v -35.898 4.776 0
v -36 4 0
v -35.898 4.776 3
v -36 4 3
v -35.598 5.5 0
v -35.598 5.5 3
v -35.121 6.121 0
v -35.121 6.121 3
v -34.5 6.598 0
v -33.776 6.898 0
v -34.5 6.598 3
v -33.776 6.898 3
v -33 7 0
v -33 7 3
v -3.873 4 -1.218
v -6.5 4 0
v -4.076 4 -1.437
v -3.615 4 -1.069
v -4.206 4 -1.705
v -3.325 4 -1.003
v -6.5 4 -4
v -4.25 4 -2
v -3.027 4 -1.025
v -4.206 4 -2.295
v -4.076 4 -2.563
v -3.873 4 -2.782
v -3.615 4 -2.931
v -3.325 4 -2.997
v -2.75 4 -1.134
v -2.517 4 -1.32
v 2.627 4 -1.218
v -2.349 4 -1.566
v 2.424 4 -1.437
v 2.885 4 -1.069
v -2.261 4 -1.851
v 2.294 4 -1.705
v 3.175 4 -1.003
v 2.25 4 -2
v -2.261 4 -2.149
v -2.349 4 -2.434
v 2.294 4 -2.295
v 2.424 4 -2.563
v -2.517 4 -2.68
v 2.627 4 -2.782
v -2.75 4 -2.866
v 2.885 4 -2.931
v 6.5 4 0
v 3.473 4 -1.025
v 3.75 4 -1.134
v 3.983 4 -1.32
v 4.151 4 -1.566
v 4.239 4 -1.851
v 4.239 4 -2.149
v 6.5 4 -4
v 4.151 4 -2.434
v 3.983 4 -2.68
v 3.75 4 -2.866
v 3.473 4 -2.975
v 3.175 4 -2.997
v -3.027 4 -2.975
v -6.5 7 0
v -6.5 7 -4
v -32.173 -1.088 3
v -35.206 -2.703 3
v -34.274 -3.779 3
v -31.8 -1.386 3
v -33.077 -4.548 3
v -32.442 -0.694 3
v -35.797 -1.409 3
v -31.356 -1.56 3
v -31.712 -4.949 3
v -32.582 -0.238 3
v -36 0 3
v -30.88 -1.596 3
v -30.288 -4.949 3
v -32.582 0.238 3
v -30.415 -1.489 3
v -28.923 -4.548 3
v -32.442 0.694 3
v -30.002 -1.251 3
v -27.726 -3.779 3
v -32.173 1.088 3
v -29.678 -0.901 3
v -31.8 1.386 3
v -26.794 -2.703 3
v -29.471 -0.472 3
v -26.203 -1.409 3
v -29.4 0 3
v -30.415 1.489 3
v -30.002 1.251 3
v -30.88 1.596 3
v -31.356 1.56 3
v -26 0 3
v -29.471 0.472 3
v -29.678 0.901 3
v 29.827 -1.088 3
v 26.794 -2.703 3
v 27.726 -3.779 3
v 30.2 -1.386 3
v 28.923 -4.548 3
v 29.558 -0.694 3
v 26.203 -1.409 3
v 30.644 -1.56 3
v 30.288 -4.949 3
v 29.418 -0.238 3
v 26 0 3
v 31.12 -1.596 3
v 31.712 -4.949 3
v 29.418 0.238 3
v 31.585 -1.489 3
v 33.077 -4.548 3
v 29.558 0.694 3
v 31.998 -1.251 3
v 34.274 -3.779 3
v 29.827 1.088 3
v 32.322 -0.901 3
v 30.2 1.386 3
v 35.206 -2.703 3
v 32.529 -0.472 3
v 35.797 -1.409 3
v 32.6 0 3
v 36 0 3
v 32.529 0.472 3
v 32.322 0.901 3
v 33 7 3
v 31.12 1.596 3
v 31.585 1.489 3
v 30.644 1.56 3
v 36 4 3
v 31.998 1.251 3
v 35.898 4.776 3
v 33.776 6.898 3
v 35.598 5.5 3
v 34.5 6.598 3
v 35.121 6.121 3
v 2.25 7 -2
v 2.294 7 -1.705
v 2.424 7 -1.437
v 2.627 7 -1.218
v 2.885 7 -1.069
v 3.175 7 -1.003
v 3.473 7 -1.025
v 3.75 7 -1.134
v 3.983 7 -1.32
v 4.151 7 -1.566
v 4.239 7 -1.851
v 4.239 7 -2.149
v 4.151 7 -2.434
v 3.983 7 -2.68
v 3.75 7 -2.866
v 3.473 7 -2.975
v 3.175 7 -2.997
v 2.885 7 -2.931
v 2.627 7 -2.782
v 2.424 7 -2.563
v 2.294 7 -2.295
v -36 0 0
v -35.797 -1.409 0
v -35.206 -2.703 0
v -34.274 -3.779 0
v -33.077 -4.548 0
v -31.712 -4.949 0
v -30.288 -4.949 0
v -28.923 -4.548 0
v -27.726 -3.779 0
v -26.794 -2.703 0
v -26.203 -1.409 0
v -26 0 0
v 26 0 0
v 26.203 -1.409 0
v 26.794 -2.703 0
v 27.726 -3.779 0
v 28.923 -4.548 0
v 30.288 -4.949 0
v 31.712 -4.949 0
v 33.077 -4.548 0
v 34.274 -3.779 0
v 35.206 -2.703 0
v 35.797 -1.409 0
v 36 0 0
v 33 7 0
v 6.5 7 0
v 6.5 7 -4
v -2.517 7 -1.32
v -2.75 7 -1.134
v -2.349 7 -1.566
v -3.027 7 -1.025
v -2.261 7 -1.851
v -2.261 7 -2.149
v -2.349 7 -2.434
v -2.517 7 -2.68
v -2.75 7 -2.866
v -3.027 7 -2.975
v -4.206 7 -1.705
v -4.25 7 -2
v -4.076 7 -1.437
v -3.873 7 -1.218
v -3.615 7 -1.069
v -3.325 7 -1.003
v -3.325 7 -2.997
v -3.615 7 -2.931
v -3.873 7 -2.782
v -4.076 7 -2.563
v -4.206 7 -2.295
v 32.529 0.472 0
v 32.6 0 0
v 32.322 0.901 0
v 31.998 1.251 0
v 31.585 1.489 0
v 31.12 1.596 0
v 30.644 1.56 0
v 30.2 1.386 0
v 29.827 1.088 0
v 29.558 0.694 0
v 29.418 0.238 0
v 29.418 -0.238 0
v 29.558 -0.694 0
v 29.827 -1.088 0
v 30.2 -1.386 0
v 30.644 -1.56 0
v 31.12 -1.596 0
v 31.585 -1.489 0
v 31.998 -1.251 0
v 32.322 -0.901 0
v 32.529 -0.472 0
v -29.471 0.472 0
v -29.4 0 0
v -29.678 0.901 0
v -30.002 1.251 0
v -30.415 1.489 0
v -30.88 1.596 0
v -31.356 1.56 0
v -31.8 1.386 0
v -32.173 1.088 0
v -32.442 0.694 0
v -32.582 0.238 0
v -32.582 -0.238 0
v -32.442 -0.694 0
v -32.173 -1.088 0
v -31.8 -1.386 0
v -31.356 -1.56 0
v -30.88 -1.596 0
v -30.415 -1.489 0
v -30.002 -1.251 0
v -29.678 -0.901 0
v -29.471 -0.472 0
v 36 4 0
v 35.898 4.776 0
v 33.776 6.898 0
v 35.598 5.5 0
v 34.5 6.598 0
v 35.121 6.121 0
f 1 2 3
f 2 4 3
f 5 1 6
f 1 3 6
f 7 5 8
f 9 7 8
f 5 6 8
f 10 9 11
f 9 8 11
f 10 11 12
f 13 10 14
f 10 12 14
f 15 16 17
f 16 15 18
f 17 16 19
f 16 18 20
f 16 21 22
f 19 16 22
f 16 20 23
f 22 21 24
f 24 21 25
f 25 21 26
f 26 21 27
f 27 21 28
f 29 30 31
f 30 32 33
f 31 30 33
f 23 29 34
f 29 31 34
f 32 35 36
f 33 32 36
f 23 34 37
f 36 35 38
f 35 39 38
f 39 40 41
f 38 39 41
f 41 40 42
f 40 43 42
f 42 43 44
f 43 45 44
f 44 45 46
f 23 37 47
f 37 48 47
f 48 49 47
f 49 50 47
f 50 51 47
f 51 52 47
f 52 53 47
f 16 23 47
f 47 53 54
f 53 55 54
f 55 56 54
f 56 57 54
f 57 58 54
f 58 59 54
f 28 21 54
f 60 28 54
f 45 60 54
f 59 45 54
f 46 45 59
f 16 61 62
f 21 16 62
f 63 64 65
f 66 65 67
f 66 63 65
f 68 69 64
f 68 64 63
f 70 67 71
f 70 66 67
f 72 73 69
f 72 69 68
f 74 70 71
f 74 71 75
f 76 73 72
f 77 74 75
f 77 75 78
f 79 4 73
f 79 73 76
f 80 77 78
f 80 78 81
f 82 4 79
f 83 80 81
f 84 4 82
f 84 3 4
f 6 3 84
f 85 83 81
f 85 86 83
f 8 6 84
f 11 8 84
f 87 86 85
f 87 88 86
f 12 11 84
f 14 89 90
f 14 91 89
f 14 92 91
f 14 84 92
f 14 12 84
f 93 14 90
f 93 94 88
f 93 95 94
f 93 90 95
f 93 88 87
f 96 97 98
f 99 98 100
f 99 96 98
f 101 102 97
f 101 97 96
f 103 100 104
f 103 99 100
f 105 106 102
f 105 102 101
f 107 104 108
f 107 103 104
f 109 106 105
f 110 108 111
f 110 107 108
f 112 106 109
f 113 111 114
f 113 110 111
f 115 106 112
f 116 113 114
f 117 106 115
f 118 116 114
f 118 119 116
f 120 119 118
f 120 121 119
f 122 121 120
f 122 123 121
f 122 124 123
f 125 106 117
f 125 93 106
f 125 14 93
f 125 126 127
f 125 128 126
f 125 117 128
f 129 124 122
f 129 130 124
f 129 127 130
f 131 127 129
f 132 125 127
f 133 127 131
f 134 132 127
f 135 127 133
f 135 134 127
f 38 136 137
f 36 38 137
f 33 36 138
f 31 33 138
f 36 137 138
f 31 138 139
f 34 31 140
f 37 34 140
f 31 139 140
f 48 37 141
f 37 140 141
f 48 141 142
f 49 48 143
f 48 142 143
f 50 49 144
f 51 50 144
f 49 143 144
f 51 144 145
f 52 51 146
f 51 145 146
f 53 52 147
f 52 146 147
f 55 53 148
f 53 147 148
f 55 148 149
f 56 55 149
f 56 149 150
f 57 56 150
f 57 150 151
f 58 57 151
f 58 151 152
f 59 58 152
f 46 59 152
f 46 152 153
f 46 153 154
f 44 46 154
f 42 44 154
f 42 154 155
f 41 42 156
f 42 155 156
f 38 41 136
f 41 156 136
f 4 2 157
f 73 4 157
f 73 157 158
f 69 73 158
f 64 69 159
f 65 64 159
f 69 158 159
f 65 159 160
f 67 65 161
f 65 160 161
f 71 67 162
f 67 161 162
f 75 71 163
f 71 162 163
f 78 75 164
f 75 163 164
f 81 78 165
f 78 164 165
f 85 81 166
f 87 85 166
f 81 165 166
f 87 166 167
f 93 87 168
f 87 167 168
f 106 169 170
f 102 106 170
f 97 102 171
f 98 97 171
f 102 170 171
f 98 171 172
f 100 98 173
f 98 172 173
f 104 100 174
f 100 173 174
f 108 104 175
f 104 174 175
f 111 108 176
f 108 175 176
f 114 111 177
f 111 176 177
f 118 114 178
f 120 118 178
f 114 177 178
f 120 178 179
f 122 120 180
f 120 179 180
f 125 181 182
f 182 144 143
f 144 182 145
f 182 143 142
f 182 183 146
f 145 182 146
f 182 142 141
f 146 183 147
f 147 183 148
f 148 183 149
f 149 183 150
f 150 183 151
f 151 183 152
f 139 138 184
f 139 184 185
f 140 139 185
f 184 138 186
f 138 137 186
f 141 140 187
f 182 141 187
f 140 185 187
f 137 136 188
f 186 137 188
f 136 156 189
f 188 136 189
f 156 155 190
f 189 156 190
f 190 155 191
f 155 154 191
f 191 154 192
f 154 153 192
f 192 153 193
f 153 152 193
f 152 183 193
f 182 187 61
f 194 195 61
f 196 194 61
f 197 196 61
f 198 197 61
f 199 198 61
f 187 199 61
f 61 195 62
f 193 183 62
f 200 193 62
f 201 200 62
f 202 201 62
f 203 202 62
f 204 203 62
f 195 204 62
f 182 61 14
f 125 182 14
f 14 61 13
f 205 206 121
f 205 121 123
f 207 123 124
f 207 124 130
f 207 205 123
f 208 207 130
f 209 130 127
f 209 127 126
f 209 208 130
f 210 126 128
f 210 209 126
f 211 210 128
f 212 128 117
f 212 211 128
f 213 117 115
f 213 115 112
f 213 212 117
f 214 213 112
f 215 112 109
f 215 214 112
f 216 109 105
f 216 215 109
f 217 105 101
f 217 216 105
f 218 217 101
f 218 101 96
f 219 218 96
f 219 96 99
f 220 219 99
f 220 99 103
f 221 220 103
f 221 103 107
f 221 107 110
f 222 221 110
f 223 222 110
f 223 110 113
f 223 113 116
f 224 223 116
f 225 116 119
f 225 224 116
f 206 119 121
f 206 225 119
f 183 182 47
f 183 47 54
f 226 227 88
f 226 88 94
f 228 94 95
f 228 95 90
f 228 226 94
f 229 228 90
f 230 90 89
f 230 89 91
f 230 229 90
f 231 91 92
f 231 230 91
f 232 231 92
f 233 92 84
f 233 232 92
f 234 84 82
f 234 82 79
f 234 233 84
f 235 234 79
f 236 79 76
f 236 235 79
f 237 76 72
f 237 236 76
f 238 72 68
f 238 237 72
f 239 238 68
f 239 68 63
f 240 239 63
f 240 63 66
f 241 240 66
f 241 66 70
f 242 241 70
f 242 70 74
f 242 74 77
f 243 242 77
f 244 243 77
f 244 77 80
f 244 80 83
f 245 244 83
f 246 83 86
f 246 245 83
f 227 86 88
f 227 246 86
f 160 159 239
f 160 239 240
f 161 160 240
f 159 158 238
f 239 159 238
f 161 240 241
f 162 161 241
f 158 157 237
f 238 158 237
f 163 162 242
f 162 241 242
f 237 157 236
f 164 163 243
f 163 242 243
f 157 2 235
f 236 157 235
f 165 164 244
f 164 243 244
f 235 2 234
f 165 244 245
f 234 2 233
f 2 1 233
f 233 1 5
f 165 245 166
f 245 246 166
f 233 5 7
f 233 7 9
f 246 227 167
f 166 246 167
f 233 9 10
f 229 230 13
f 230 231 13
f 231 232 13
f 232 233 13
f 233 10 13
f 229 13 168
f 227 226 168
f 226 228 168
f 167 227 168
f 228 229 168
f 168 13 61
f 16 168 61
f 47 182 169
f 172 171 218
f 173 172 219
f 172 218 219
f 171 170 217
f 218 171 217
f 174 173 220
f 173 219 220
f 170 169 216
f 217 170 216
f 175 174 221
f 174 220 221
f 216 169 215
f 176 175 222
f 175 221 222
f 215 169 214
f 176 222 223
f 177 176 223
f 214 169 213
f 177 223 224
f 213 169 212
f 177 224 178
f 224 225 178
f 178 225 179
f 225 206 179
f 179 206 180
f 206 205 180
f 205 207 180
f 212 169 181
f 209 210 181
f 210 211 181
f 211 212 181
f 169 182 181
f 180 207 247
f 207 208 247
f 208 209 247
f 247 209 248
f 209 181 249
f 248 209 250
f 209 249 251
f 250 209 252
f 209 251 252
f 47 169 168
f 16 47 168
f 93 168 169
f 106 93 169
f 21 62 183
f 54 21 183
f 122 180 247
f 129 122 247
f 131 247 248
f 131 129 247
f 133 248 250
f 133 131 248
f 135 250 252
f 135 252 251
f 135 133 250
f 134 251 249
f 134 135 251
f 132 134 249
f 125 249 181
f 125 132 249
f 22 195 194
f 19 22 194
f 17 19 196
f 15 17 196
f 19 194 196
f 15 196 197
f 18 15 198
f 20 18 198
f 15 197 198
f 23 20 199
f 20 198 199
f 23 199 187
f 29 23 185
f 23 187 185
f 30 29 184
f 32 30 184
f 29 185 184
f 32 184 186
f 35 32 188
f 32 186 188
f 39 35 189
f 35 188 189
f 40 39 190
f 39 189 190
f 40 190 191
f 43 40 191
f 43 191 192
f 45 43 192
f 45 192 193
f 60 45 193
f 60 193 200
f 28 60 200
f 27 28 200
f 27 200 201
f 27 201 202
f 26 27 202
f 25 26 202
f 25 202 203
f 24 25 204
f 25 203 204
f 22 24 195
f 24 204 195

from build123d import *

# Parameters (mm, degrees)
SKETCH_1_R      = 1.6
EXTRUDE_1_DEPTH = 3
SKETCH_6_W      = 13
SKETCH_6_H      = 4
SKETCH_6_R      = 1
EXTRUDE_3_DEPTH = 3
FILLET_1_R      = 3


with BuildPart() as part:
    # ｽｹｯﾁ1 → ﾎﾞｽ - 押し出し1 (new body)
    with BuildSketch(Plane.XY):
        with BuildLine():
            Line((-26, 0), (26, 0))
            ThreePointArc((26, 0), (31, -5), (36, 0))
            Line((36, 0), (36, 7))
            Line((36, 7), (-36, 7))
            Line((-36, 7), (-36, 0))
            ThreePointArc((-36, 0), (-31, -5), (-26, 0))
        make_face()
        with Locations((-31, 0)):
            Circle(SKETCH_1_R, mode=Mode.SUBTRACT)
        with Locations((31, 0)):
            Circle(SKETCH_1_R, mode=Mode.SUBTRACT)
    extrude(amount=EXTRUDE_1_DEPTH)

    # ｽｹｯﾁ6 → ﾎﾞｽ - 押し出し3 (add)
    with BuildSketch(Plane(origin=(0, 7, 0), x_dir=(1, 0, 0), z_dir=(0, 1, 0))):
        with Locations((0, 2)):
            Rectangle(SKETCH_6_W, SKETCH_6_H)
        with Locations(Location((-3.25, 2, 0), (0, 0, 180))):
            Circle(SKETCH_6_R, mode=Mode.SUBTRACT)
        with Locations(Location((3.25, 2, 0), (0, 0, 180))):
            Circle(SKETCH_6_R, mode=Mode.SUBTRACT)
    extrude(amount=-EXTRUDE_3_DEPTH)

    # ﾌｨﾚｯﾄ1
    fillet_1_edges = [part.edges().sort_by_distance(p)[0] for p in [
        (-36, 7, 1.5),
        (36, 7, 1.5),
    ]]
    fillet(fillet_1_edges, radius=FILLET_1_R)


solid = part.part
